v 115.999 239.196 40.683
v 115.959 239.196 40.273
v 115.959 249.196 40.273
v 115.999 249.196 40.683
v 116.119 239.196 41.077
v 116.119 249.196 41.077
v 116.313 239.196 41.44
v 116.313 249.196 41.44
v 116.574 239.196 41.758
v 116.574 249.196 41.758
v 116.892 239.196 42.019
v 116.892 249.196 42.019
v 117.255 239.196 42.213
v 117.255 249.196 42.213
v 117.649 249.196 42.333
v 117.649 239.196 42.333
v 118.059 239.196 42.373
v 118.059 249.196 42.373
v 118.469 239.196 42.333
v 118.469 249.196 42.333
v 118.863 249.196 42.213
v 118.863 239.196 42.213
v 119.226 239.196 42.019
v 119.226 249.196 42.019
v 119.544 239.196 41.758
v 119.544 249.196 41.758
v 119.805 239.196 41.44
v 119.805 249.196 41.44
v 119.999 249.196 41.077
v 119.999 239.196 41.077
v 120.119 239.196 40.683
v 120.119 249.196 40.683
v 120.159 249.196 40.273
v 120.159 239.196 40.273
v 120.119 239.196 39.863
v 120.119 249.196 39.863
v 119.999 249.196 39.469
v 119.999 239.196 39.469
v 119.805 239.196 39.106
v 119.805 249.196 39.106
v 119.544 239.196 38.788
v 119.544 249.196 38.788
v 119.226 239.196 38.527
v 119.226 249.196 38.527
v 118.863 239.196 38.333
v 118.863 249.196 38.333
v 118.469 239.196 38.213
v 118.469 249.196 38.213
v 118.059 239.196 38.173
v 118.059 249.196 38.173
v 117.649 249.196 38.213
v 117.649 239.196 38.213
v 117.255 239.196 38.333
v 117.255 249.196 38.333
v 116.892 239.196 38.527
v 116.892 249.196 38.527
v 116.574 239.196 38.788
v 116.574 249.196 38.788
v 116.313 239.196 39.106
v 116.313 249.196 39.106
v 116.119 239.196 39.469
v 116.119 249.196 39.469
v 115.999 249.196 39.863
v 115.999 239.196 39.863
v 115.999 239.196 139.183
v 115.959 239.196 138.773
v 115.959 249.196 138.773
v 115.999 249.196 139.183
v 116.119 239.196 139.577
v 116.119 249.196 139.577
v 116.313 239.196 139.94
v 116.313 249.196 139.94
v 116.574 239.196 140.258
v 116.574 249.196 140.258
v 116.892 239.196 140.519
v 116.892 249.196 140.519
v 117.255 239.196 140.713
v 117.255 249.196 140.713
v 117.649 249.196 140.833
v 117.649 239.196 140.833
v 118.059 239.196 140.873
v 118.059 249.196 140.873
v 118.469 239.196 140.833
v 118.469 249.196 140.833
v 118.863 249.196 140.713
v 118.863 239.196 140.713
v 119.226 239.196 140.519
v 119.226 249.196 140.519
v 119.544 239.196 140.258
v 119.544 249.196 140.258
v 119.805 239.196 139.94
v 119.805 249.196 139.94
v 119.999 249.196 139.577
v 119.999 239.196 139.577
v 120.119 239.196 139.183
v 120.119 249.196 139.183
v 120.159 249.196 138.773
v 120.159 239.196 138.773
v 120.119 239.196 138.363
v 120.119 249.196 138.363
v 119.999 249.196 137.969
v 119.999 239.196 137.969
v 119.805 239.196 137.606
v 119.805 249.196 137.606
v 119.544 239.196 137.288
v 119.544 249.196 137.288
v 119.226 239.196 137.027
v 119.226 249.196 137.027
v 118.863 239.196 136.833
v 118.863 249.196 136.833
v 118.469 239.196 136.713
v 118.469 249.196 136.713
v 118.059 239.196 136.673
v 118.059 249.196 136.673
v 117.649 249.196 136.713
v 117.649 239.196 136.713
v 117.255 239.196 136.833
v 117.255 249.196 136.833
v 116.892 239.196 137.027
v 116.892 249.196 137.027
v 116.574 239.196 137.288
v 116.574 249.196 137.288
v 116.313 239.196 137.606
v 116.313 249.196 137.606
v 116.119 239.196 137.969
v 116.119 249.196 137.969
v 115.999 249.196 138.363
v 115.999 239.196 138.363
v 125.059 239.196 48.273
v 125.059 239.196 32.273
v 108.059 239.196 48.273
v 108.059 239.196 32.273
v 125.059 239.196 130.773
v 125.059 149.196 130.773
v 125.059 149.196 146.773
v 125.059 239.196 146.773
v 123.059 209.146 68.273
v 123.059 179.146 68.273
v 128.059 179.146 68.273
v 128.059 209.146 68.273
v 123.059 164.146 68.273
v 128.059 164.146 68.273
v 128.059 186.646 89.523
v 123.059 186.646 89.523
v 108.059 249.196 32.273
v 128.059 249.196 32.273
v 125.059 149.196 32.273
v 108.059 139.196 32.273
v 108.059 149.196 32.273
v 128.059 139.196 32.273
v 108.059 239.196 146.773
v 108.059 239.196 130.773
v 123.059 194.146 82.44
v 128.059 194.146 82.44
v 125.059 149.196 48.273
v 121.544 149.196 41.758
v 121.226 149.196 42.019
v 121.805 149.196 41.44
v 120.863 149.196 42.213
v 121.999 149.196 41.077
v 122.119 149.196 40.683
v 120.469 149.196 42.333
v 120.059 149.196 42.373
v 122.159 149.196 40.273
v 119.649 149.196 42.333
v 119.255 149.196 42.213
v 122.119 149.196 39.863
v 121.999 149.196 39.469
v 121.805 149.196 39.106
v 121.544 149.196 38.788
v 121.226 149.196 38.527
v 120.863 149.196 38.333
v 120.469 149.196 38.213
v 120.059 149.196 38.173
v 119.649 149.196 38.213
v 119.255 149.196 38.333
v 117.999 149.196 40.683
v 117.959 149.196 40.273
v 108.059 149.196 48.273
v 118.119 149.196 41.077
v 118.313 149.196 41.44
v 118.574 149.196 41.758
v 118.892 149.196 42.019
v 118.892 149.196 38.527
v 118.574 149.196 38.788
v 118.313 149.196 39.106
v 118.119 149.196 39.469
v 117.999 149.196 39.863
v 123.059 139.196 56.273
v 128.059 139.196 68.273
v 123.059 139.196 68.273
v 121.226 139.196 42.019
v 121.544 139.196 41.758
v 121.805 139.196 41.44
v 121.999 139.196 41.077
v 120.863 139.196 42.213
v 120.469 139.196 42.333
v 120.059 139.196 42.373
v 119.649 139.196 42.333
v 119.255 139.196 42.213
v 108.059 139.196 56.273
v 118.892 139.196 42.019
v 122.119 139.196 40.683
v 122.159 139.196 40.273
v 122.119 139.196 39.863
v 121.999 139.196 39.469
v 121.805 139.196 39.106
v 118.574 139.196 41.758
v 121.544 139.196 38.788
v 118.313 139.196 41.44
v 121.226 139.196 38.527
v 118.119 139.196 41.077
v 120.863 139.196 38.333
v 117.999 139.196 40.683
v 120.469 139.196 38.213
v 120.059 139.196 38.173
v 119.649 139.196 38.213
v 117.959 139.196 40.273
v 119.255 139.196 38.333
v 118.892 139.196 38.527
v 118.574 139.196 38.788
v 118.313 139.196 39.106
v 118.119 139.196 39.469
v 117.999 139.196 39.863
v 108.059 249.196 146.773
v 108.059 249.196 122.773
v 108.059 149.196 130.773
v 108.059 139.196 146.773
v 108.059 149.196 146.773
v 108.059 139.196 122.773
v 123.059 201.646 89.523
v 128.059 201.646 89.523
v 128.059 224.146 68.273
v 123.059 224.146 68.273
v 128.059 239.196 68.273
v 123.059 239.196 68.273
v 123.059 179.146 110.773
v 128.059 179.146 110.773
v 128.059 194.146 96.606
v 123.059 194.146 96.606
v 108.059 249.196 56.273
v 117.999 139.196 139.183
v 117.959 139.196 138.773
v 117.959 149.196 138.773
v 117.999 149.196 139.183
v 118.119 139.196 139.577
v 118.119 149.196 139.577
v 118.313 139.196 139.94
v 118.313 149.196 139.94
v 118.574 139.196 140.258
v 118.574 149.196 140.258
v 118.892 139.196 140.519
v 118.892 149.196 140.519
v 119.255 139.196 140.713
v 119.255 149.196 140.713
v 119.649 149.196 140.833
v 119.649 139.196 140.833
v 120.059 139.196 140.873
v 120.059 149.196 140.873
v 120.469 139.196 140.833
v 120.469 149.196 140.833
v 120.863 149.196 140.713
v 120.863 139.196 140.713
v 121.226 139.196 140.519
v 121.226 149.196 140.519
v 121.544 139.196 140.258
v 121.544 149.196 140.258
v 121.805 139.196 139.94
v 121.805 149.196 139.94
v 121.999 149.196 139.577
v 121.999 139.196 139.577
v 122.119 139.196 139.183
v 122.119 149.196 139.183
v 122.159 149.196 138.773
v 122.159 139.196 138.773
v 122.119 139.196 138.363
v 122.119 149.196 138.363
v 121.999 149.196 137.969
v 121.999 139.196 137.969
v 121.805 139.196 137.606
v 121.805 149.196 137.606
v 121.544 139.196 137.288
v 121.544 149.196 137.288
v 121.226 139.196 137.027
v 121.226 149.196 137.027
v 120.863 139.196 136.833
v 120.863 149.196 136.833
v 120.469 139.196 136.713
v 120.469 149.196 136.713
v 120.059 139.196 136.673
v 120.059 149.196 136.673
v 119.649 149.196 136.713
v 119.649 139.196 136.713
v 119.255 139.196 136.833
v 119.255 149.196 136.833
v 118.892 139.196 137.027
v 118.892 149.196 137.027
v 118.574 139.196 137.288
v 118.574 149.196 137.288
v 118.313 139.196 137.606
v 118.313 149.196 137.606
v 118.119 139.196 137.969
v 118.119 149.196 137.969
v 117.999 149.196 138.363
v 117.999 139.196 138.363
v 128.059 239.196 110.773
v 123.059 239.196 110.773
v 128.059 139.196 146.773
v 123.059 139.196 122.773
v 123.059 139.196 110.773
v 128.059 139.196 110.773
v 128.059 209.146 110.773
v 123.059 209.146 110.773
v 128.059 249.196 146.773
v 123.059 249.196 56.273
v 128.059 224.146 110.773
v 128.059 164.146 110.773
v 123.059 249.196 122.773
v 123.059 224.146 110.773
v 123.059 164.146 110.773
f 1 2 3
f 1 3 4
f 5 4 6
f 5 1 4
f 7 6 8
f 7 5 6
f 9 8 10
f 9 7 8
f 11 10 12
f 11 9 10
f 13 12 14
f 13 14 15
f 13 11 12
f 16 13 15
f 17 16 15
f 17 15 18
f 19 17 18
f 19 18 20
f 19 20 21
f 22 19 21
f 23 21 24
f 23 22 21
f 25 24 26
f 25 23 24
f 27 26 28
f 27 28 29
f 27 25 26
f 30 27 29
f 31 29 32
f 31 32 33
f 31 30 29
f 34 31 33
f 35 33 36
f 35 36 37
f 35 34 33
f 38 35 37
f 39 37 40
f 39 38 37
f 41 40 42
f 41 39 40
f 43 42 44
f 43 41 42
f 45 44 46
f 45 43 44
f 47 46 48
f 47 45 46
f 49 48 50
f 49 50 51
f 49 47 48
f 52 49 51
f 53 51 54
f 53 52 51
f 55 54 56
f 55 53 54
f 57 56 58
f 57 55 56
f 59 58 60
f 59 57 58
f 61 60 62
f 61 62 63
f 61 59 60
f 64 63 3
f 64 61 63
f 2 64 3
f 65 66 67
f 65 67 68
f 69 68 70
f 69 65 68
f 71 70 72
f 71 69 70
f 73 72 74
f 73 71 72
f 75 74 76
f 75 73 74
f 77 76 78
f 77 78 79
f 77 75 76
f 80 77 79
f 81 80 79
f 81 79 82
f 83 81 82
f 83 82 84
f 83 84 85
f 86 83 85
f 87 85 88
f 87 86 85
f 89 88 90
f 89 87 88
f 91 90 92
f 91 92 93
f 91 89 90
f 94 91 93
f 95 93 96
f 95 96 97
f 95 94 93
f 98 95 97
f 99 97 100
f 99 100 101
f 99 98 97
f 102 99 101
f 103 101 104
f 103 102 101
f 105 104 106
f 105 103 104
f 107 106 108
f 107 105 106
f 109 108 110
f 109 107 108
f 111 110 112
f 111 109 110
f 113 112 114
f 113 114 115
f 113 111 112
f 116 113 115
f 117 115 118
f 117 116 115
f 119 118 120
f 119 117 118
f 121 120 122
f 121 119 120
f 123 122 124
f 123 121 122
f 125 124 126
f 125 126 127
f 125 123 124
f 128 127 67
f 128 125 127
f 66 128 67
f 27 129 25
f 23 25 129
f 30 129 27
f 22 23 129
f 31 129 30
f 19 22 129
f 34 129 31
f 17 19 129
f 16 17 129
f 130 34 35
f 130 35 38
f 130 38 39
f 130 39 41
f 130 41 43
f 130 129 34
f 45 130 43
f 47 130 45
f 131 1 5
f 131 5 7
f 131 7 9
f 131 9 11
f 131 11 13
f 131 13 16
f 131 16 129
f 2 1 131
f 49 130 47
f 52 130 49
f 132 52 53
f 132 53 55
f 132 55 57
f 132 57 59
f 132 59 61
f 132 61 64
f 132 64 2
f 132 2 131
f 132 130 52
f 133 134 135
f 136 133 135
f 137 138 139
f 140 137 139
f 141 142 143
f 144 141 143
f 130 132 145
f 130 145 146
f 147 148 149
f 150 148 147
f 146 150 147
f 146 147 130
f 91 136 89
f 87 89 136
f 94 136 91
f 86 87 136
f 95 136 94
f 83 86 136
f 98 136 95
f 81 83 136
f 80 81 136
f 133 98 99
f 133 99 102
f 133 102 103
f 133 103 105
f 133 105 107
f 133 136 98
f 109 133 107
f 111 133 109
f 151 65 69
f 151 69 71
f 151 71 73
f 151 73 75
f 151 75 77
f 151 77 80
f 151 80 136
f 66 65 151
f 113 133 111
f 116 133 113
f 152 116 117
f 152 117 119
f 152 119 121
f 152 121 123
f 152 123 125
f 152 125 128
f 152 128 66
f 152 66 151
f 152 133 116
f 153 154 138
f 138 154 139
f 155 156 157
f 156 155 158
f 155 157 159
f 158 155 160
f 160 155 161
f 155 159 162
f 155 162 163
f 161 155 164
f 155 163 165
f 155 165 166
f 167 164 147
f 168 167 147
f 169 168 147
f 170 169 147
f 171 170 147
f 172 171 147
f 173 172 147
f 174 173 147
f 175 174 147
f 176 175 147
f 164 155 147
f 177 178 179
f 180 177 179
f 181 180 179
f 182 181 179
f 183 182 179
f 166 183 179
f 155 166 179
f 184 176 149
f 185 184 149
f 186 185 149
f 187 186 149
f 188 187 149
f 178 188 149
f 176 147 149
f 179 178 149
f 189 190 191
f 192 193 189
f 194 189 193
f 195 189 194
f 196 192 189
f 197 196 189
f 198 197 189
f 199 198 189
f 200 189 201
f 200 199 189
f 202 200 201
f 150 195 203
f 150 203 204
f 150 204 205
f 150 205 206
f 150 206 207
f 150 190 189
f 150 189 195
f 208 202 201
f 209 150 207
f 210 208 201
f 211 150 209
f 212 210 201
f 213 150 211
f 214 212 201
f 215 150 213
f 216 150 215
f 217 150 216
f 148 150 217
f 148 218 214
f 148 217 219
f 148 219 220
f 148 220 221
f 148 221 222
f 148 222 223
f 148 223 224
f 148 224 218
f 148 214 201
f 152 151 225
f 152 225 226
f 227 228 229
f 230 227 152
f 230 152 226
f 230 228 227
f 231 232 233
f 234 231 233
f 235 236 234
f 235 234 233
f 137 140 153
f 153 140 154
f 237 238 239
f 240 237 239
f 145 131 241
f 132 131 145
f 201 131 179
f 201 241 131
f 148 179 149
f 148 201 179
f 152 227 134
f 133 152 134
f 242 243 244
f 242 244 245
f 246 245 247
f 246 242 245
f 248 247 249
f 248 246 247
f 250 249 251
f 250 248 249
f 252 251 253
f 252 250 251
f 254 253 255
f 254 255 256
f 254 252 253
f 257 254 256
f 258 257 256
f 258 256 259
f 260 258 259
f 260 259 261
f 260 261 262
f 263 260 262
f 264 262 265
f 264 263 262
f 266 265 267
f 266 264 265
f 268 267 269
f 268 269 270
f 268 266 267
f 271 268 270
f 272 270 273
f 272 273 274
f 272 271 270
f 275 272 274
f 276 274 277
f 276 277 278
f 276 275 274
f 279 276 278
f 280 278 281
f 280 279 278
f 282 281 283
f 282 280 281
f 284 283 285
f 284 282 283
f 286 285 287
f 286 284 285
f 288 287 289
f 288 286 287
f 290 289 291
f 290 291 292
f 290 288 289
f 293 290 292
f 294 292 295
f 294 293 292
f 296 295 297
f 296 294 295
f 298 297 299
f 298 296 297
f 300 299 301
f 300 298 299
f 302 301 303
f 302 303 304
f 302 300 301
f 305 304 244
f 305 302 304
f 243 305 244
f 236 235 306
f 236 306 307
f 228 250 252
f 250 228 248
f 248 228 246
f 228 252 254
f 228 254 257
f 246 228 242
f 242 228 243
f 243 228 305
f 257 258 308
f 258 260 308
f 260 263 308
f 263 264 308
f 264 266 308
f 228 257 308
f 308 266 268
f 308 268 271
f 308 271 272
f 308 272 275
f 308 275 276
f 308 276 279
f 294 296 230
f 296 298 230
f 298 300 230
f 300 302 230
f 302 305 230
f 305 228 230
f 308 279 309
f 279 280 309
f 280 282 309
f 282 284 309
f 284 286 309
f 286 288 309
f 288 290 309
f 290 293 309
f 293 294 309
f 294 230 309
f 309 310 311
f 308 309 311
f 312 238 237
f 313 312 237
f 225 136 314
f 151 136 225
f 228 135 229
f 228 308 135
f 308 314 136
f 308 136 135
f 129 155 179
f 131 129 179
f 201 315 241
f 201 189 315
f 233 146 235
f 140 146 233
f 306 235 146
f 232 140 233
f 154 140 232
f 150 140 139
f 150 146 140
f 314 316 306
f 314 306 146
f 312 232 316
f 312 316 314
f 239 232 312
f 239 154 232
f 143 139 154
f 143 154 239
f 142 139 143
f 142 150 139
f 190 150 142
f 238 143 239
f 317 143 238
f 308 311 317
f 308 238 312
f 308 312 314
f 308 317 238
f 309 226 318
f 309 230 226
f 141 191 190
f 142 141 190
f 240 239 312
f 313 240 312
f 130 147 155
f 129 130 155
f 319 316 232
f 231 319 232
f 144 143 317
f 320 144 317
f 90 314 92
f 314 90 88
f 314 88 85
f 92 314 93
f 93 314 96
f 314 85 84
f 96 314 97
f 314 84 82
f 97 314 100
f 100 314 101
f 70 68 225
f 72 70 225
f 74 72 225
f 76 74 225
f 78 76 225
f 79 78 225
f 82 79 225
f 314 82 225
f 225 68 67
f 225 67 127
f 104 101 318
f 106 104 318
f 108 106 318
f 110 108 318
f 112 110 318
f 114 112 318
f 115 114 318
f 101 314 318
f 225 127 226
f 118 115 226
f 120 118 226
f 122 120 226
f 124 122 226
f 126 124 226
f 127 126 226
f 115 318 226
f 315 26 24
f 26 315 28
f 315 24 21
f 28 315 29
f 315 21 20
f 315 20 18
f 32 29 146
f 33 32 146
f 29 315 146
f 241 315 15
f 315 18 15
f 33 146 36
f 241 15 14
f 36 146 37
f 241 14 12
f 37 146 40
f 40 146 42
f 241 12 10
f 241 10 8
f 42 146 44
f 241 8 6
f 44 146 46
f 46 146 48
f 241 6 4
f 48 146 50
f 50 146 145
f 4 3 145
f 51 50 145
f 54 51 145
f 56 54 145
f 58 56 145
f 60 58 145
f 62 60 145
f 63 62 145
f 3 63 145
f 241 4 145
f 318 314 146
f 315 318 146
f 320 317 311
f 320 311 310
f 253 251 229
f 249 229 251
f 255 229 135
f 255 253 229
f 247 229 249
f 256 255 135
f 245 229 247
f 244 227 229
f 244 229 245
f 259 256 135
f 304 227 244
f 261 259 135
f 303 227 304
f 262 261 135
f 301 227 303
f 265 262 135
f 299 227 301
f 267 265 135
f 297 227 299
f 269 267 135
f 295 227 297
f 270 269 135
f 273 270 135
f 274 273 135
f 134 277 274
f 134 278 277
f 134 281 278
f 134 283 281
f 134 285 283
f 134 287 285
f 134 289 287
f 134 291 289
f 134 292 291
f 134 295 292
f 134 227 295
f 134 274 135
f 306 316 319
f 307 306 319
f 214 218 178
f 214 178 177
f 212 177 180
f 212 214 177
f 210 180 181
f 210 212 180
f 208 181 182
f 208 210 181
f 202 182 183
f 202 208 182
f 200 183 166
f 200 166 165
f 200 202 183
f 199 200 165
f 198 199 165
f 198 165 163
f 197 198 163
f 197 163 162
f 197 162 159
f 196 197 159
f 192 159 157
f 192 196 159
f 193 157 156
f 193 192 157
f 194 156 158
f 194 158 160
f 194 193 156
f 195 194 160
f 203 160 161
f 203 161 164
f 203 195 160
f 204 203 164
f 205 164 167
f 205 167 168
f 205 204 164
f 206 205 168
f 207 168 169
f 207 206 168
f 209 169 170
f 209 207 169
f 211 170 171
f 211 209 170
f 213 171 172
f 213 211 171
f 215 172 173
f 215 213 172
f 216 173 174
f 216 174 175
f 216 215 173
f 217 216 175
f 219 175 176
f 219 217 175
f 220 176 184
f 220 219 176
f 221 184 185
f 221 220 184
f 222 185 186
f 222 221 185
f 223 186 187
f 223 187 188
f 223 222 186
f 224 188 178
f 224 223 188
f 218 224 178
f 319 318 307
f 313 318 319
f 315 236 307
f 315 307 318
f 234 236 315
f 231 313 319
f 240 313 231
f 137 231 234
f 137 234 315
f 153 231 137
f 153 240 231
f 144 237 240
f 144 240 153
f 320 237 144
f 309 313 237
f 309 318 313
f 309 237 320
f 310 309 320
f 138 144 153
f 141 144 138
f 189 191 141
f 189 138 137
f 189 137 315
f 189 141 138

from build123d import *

# Parameters (mm, degrees)
SKETCH_1_R      = 2.1
EXTRUDE_1_DEPTH = 10
EXTRUDE_2_DEPTH = 90
SKETCH_3_R      = 2.1
EXTRUDE_3_DEPTH = 10
EXTRUDE_4_DEPTH = 90
EXTRUDE_5_DEPTH = 5
SKETCH_6_R      = 2.1
EXTRUDE_6_DEPTH = 10


with BuildPart() as part:
    # Эскиз1 → Бобышка-Вытянуть1 (new body)
    with BuildSketch(Plane(origin=(0, 139.195974268, 0), x_dir=(1, 0, 0), z_dir=(0, 1, 0))):
        Polygon((108.058980694, -32.273129836), (128.058980694, -32.273129836), (128.058980694, -68.273129836), (123.058980694, -68.273129836), (123.058980694, -56.273129836), (108.058980694, -56.273129836), align=None)
        with Locations(Location((120.058980694, -40.273129836, 0), (0, 0, 180))):
            Circle(SKETCH_1_R, mode=Mode.SUBTRACT)
    extrude(amount=EXTRUDE_1_DEPTH)

    # Эскиз2 → Бобышка-Вытянуть2 (add)
    with BuildSketch(Plane(origin=(0, 149.195974268, 0), x_dir=(1, 0, 0), z_dir=(0, 1, 0))):
        Polygon((128.058980694, -32.273129836), (125.058980694, -32.273129836), (125.058980694, -48.273129836), (108.058980694, -48.273129836), (108.058980694, -56.273129836), (123.058980694, -56.273129836), (123.058980694, -68.273129836), (128.058980694, -68.273129836), align=None)
    extrude(amount=EXTRUDE_2_DEPTH)



with BuildPart() as body_2:
    # Эскиз3 → Бобышка-Вытянуть3 (new body)
    with BuildSketch(Plane(origin=(0, 139.195974268, 0), x_dir=(1, 0, 0), z_dir=(0, 1, 0))):
        Polygon((123.058980694, -110.773129836), (123.058980694, -122.773129836), (108.058980694, -122.773129836), (108.058980694, -146.773129836), (128.058980694, -146.773129836), (128.058980694, -110.773129836), align=None)
        with Locations(Location((120.058980694, -138.773129836, 0), (0, 0, 180))):
            Circle(SKETCH_3_R, mode=Mode.SUBTRACT)
    extrude(amount=EXTRUDE_3_DEPTH)

    # Эскиз4 → Бобышка-Вытянуть4 (add)
    with BuildSketch(Plane(origin=(0, 149.195974268, 0), x_dir=(1, 0, 0), z_dir=(0, 1, 0))):
        Polygon((123.058980694, -110.773129836), (123.058980694, -122.773129836), (108.058980694, -122.773129836), (108.058980694, -130.773129836), (125.058980694, -130.773129836), (125.058980694, -146.773129836), (128.058980694, -146.773129836), (128.058980694, -110.773129836), align=None)
    extrude(amount=EXTRUDE_4_DEPTH)


with BuildPart() as part_1:
    add(part.part)

    add(body_2.part)  # Бобышка-Вытянуть5 merges body 2
    # Эскиз5 → Бобышка-Вытянуть5 (add)
    with BuildSketch(Plane(origin=(128.058980694, 0, 0), x_dir=(0, 0, -1), z_dir=(1, 0, 0))):
        Polygon((-68.273129836, 224.145974268), (-68.273129836, 209.145974268), (-82.439796503, 194.145974268), (-68.273129836, 179.145974268), (-68.273129836, 164.145974268), (-89.523129836, 186.645974268), (-110.773129836, 164.145974268), (-110.773129836, 179.145974268), (-96.60646317, 194.145974268), (-110.773129836, 209.145974268), (-110.773129836, 224.145974268), (-89.523129836, 201.645974268), align=None)
    extrude(amount=-EXTRUDE_5_DEPTH)

    # Эскиз6 → Бобышка-Вытянуть6 (add)
    with BuildSketch(Plane(origin=(0, 239.195974268, 0), x_dir=(1, 0, 0), z_dir=(0, 1, 0))):
        Polygon((108.058980694, -56.273129836), (108.058980694, -32.273129836), (128.058980694, -32.273129836), (128.058980694, -146.773129836), (108.058980694, -146.773129836), (108.058980694, -122.773129836), (123.058980694, -122.773129836), (123.058980694, -56.273129836), align=None)
        with Locations(Location((118.058980694, -40.273129836, 0), (0, 0, 180))):
            Circle(SKETCH_6_R, mode=Mode.SUBTRACT)
        with Locations(Location((118.058980694, -138.773129836, 0), (0, 0, 180))):
            Circle(SKETCH_6_R, mode=Mode.SUBTRACT)
    extrude(amount=EXTRUDE_6_DEPTH)


solid = part_1.part
